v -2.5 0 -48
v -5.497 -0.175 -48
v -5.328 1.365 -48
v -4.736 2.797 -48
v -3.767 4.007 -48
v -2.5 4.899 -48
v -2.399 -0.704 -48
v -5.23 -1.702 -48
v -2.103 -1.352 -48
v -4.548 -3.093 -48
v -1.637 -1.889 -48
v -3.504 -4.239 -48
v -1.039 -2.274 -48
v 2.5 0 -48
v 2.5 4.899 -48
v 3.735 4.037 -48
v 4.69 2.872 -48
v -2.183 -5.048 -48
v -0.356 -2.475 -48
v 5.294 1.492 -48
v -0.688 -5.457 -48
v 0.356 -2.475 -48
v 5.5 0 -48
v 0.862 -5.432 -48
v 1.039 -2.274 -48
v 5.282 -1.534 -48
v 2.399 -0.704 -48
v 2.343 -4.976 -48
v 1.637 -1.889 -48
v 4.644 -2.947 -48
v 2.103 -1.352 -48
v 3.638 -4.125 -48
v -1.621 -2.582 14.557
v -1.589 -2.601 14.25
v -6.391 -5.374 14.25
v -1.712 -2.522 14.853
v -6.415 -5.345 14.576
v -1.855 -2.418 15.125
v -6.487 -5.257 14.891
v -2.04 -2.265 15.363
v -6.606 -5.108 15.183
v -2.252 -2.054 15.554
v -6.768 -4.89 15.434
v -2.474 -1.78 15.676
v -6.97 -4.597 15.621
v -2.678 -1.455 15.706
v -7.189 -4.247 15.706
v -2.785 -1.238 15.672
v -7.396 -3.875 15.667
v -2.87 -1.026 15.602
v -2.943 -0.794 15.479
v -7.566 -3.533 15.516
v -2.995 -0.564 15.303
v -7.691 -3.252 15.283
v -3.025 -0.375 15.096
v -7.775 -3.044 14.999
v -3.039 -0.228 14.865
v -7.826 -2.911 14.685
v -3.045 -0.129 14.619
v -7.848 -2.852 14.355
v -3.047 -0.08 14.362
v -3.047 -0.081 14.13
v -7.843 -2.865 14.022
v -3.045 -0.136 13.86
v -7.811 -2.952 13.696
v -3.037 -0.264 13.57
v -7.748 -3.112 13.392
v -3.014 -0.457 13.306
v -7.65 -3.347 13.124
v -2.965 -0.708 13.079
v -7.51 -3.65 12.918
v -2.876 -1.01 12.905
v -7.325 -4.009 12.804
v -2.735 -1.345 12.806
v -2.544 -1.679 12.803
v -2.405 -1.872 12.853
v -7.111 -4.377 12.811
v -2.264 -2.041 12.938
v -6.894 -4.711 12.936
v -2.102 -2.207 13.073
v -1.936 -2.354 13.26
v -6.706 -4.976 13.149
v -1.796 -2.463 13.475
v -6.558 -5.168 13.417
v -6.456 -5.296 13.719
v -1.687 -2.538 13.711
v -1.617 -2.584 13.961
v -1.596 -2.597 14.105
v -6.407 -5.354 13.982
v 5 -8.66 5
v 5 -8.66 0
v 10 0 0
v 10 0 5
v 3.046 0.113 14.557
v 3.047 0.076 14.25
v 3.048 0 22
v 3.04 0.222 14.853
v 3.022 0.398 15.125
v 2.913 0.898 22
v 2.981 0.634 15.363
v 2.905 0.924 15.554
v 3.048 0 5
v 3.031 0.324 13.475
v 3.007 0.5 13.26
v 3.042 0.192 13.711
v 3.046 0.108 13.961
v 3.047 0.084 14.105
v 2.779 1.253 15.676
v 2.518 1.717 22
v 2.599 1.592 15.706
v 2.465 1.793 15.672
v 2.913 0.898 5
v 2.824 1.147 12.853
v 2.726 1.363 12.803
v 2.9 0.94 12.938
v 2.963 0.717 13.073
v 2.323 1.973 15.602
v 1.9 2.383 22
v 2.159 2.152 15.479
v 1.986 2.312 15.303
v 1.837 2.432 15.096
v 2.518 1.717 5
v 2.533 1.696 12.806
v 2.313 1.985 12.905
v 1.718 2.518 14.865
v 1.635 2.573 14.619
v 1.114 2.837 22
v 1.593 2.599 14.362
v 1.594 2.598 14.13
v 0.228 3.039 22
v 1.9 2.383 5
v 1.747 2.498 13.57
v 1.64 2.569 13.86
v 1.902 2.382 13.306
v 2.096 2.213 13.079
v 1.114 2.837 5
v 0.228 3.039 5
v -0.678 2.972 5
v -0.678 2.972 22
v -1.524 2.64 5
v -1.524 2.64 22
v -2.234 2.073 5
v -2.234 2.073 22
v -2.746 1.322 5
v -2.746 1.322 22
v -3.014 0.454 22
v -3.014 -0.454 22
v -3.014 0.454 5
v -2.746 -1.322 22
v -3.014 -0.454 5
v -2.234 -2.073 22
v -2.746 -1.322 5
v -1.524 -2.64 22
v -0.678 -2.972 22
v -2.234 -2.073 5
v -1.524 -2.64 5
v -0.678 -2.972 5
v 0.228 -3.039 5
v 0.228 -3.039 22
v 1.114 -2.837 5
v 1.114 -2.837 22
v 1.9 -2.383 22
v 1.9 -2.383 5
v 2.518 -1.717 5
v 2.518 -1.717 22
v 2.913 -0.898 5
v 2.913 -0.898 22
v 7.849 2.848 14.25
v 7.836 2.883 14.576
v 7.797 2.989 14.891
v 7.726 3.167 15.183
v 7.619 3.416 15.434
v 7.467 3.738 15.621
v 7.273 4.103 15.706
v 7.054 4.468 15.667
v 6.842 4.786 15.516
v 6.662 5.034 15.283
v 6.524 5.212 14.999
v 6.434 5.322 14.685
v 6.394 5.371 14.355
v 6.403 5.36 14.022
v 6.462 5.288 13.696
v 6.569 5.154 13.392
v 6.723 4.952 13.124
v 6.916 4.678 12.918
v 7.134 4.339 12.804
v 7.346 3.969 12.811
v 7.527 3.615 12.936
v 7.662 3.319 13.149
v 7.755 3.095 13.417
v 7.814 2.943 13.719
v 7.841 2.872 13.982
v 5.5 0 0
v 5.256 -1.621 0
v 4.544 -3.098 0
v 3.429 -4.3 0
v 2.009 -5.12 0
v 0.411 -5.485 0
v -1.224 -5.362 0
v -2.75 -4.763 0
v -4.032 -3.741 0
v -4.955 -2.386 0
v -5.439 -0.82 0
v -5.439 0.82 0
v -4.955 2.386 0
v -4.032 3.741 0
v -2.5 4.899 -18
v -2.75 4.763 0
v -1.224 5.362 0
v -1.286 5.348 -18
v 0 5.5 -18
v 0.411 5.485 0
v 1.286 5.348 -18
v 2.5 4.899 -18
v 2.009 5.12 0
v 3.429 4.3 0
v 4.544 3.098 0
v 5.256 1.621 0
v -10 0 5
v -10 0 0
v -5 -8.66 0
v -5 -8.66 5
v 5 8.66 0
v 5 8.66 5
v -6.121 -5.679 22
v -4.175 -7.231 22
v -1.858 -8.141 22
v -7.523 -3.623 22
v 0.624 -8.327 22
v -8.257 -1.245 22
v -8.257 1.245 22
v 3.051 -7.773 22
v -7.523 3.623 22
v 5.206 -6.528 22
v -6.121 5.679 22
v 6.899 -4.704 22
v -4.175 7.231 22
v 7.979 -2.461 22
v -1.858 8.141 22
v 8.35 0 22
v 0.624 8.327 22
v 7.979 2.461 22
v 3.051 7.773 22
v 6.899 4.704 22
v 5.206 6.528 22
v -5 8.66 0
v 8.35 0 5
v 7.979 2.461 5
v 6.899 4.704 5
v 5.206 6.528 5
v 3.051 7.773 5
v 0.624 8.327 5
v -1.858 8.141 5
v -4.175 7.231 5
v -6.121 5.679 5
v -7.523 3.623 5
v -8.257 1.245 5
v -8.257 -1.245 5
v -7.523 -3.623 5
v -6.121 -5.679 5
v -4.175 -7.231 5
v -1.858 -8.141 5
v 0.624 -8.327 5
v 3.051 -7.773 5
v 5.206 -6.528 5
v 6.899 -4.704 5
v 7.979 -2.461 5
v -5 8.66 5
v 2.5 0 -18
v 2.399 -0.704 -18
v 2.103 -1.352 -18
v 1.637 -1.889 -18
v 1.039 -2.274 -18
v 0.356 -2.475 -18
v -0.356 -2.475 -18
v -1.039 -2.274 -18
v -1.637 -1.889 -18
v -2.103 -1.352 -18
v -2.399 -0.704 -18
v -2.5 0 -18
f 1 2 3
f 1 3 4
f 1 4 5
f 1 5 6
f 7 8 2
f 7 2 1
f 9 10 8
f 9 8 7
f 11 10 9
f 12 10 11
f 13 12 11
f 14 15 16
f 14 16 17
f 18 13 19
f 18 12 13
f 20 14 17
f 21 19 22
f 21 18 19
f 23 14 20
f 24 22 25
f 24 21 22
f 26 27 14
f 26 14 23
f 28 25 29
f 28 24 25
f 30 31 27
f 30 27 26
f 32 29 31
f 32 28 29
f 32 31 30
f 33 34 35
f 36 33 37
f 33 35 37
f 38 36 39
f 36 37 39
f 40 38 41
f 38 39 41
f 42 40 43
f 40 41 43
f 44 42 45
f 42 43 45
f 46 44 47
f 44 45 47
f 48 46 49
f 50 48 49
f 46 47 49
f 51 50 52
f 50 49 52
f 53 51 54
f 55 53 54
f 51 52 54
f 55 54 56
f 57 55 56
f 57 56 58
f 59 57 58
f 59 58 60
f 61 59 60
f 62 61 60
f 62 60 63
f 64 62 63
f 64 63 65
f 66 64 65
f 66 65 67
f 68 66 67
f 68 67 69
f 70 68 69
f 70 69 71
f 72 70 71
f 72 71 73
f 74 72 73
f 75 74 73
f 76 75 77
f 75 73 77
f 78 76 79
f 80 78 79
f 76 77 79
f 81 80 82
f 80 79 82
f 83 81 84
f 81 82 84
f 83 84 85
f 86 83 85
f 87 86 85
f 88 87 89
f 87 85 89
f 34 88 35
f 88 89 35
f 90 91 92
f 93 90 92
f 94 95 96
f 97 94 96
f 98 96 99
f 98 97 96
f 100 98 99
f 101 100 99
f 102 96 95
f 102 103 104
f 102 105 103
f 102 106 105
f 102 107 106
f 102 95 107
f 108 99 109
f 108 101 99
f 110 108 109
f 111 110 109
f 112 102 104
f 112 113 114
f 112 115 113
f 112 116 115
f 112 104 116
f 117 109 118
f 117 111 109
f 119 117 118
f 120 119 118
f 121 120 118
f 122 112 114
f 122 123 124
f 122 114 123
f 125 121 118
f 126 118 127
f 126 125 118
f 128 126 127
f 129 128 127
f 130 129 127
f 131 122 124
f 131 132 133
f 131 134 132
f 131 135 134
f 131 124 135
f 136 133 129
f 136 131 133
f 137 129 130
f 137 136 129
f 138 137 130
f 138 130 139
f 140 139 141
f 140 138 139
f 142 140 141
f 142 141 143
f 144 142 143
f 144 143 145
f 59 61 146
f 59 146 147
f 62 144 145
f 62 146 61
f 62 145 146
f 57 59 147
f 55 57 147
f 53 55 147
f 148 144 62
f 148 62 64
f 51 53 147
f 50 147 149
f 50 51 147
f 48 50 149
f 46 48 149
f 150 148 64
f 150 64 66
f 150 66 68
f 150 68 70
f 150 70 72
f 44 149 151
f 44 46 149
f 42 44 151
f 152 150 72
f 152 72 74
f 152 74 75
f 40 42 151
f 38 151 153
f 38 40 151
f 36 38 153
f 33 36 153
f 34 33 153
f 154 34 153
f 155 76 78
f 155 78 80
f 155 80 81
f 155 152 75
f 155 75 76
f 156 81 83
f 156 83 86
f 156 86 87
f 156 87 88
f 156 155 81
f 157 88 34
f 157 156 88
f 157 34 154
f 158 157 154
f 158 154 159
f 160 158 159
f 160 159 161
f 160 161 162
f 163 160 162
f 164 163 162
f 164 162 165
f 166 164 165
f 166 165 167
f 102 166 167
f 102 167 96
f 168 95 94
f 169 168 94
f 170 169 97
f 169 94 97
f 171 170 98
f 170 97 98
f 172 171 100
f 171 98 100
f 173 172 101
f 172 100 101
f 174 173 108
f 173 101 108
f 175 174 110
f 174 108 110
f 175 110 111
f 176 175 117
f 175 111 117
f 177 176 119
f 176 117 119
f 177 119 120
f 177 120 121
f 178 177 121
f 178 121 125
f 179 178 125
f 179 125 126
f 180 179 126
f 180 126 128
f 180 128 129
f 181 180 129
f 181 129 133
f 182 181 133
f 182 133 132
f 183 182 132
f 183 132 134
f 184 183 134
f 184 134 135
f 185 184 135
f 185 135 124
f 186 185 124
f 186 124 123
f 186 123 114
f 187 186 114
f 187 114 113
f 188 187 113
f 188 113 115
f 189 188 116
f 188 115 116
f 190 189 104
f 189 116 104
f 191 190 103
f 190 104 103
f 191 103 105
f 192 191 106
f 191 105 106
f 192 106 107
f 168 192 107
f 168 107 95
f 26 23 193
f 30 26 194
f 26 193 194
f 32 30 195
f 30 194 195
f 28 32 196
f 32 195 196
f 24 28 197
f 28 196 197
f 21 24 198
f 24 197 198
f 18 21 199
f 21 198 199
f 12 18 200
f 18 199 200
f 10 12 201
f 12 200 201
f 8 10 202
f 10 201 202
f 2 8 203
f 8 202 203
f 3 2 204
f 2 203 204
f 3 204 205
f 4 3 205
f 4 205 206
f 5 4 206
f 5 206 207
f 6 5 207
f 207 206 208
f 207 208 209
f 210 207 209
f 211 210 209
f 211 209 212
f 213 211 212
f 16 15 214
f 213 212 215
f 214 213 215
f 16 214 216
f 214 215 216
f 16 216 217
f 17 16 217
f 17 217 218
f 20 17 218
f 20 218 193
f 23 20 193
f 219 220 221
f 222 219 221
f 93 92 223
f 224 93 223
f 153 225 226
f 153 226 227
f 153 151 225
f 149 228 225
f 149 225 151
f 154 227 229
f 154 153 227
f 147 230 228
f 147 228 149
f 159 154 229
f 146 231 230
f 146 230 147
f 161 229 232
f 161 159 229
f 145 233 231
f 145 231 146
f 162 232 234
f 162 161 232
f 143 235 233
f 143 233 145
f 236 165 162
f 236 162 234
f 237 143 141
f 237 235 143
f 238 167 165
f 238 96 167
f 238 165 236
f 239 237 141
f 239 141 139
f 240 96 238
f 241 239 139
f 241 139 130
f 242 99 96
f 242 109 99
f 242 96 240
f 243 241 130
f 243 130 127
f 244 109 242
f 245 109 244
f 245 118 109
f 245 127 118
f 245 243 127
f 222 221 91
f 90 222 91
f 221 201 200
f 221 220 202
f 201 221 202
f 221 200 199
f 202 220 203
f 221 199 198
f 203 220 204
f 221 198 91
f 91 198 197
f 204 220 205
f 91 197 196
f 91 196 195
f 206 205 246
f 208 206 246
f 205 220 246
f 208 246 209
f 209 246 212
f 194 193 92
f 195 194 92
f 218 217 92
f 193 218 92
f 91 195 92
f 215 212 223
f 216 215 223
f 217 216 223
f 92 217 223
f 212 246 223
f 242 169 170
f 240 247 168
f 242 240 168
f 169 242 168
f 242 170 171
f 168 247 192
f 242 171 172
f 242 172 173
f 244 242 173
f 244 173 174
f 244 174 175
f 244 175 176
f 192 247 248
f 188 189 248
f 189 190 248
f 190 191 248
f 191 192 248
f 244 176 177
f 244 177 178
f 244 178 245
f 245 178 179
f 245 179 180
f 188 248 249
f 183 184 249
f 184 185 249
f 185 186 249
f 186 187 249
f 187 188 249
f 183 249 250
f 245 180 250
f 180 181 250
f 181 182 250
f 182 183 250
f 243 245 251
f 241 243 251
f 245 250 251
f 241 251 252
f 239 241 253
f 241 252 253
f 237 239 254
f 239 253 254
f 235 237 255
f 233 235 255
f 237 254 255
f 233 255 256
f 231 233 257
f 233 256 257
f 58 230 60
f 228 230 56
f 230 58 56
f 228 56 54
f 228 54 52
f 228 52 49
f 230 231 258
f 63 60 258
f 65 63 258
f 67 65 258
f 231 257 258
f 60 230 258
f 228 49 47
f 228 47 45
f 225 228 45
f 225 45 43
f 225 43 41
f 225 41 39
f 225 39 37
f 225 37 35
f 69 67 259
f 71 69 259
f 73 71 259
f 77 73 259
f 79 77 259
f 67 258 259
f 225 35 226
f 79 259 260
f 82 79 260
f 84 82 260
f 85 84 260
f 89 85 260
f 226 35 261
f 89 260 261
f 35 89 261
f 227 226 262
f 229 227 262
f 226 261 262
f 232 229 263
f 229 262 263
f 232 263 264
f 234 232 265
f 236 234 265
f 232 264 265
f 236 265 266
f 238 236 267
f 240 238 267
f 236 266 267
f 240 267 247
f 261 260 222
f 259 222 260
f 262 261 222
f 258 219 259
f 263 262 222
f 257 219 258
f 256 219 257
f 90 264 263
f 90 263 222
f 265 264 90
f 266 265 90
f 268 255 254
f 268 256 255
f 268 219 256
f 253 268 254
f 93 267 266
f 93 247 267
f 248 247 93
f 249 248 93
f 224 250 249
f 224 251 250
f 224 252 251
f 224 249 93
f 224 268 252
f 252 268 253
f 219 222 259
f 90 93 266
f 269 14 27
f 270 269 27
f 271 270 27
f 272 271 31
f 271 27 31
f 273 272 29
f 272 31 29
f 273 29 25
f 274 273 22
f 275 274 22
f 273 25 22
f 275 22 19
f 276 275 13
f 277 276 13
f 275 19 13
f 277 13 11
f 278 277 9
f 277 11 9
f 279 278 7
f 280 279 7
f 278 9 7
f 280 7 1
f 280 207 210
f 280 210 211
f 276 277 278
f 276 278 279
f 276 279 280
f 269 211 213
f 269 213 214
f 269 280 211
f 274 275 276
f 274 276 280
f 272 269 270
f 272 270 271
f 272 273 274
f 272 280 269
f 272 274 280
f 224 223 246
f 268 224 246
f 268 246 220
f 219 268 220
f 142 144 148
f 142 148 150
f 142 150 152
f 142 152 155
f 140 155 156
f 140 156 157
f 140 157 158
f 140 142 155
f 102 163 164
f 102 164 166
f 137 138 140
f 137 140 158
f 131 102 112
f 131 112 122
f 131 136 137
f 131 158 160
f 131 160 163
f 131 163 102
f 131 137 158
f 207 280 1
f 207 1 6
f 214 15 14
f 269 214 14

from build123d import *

# Parameters (mm, degrees)
F1_DEPTH = 4.99999
F2_R     = 8.34999981
F2_R_2   = 3.048
F3_DEPTH = 16.9999914
F4_R     = 1.4581169527
F5_DEPTH = 25.4
F6_R     = 5.5000017
F7_DEPTH = 47.999904
F9_DEPTH = 29.99994


# Not quite as in the source:
# - ends of sketch curves that miss each other by under 0.0002 mm in the source are joined


with BuildPart() as f1:
    # F0 (on Top) → F1 (new body)
    with BuildSketch(Plane.XY):
        Polygon((10.0000054, 0), (5.0000027, 8.6602587144), (-5.0000027, 8.6602587144), (-10.0000054, 0), (-5.0000027, -8.6602587144), (5.0000027, -8.6602587144), align=None)
    extrude(amount=F1_DEPTH)

    # F2 (on face) → F3 (join)
    with BuildSketch(Plane.XY.offset(4.99999)):
        Circle(F2_R)
        Circle(F2_R_2, mode=Mode.SUBTRACT)
    extrude(amount=F3_DEPTH)

    # F4 (on face) → F5 (cut)
    with BuildSketch(Plane(origin=(-7.50000405, -4.3301293572, 0), x_dir=(0.5, -0.8660254038, 0), z_dir=(-0.8660254038, -0.5, 0))):
        with Locations((0, 14.2499814)):
            Circle(F4_R)
    extrude(amount=-F5_DEPTH, mode=Mode.SUBTRACT)

    # F6 (on face) → F7 (join)
    with BuildSketch(Plane(origin=(0, 0, 0), x_dir=(1, 0, 0), z_dir=(0, 0, -1))):
        Circle(F6_R)
    extrude(amount=F7_DEPTH)

    # F8 (on face) → F9 (cut)
    with BuildSketch(Plane(origin=(0, 0, -47.999904), x_dir=(1, 0, 0), z_dir=(0, 0, -1))):
        with BuildLine():
            Line((2.5, -4.8989813941), (2.5, 0))
            ThreePointArc((2.5, 0), (0, 2.499995), (-2.499995, 0))
            Line((-2.499995, 0), (-2.5, -4.8989813941))
            ThreePointArc((-2.5, -4.8989813941), (0, -5.5000017), (2.5, -4.8989813941))
        make_face()
    extrude(amount=-F9_DEPTH, mode=Mode.SUBTRACT)


solid = f1.part
